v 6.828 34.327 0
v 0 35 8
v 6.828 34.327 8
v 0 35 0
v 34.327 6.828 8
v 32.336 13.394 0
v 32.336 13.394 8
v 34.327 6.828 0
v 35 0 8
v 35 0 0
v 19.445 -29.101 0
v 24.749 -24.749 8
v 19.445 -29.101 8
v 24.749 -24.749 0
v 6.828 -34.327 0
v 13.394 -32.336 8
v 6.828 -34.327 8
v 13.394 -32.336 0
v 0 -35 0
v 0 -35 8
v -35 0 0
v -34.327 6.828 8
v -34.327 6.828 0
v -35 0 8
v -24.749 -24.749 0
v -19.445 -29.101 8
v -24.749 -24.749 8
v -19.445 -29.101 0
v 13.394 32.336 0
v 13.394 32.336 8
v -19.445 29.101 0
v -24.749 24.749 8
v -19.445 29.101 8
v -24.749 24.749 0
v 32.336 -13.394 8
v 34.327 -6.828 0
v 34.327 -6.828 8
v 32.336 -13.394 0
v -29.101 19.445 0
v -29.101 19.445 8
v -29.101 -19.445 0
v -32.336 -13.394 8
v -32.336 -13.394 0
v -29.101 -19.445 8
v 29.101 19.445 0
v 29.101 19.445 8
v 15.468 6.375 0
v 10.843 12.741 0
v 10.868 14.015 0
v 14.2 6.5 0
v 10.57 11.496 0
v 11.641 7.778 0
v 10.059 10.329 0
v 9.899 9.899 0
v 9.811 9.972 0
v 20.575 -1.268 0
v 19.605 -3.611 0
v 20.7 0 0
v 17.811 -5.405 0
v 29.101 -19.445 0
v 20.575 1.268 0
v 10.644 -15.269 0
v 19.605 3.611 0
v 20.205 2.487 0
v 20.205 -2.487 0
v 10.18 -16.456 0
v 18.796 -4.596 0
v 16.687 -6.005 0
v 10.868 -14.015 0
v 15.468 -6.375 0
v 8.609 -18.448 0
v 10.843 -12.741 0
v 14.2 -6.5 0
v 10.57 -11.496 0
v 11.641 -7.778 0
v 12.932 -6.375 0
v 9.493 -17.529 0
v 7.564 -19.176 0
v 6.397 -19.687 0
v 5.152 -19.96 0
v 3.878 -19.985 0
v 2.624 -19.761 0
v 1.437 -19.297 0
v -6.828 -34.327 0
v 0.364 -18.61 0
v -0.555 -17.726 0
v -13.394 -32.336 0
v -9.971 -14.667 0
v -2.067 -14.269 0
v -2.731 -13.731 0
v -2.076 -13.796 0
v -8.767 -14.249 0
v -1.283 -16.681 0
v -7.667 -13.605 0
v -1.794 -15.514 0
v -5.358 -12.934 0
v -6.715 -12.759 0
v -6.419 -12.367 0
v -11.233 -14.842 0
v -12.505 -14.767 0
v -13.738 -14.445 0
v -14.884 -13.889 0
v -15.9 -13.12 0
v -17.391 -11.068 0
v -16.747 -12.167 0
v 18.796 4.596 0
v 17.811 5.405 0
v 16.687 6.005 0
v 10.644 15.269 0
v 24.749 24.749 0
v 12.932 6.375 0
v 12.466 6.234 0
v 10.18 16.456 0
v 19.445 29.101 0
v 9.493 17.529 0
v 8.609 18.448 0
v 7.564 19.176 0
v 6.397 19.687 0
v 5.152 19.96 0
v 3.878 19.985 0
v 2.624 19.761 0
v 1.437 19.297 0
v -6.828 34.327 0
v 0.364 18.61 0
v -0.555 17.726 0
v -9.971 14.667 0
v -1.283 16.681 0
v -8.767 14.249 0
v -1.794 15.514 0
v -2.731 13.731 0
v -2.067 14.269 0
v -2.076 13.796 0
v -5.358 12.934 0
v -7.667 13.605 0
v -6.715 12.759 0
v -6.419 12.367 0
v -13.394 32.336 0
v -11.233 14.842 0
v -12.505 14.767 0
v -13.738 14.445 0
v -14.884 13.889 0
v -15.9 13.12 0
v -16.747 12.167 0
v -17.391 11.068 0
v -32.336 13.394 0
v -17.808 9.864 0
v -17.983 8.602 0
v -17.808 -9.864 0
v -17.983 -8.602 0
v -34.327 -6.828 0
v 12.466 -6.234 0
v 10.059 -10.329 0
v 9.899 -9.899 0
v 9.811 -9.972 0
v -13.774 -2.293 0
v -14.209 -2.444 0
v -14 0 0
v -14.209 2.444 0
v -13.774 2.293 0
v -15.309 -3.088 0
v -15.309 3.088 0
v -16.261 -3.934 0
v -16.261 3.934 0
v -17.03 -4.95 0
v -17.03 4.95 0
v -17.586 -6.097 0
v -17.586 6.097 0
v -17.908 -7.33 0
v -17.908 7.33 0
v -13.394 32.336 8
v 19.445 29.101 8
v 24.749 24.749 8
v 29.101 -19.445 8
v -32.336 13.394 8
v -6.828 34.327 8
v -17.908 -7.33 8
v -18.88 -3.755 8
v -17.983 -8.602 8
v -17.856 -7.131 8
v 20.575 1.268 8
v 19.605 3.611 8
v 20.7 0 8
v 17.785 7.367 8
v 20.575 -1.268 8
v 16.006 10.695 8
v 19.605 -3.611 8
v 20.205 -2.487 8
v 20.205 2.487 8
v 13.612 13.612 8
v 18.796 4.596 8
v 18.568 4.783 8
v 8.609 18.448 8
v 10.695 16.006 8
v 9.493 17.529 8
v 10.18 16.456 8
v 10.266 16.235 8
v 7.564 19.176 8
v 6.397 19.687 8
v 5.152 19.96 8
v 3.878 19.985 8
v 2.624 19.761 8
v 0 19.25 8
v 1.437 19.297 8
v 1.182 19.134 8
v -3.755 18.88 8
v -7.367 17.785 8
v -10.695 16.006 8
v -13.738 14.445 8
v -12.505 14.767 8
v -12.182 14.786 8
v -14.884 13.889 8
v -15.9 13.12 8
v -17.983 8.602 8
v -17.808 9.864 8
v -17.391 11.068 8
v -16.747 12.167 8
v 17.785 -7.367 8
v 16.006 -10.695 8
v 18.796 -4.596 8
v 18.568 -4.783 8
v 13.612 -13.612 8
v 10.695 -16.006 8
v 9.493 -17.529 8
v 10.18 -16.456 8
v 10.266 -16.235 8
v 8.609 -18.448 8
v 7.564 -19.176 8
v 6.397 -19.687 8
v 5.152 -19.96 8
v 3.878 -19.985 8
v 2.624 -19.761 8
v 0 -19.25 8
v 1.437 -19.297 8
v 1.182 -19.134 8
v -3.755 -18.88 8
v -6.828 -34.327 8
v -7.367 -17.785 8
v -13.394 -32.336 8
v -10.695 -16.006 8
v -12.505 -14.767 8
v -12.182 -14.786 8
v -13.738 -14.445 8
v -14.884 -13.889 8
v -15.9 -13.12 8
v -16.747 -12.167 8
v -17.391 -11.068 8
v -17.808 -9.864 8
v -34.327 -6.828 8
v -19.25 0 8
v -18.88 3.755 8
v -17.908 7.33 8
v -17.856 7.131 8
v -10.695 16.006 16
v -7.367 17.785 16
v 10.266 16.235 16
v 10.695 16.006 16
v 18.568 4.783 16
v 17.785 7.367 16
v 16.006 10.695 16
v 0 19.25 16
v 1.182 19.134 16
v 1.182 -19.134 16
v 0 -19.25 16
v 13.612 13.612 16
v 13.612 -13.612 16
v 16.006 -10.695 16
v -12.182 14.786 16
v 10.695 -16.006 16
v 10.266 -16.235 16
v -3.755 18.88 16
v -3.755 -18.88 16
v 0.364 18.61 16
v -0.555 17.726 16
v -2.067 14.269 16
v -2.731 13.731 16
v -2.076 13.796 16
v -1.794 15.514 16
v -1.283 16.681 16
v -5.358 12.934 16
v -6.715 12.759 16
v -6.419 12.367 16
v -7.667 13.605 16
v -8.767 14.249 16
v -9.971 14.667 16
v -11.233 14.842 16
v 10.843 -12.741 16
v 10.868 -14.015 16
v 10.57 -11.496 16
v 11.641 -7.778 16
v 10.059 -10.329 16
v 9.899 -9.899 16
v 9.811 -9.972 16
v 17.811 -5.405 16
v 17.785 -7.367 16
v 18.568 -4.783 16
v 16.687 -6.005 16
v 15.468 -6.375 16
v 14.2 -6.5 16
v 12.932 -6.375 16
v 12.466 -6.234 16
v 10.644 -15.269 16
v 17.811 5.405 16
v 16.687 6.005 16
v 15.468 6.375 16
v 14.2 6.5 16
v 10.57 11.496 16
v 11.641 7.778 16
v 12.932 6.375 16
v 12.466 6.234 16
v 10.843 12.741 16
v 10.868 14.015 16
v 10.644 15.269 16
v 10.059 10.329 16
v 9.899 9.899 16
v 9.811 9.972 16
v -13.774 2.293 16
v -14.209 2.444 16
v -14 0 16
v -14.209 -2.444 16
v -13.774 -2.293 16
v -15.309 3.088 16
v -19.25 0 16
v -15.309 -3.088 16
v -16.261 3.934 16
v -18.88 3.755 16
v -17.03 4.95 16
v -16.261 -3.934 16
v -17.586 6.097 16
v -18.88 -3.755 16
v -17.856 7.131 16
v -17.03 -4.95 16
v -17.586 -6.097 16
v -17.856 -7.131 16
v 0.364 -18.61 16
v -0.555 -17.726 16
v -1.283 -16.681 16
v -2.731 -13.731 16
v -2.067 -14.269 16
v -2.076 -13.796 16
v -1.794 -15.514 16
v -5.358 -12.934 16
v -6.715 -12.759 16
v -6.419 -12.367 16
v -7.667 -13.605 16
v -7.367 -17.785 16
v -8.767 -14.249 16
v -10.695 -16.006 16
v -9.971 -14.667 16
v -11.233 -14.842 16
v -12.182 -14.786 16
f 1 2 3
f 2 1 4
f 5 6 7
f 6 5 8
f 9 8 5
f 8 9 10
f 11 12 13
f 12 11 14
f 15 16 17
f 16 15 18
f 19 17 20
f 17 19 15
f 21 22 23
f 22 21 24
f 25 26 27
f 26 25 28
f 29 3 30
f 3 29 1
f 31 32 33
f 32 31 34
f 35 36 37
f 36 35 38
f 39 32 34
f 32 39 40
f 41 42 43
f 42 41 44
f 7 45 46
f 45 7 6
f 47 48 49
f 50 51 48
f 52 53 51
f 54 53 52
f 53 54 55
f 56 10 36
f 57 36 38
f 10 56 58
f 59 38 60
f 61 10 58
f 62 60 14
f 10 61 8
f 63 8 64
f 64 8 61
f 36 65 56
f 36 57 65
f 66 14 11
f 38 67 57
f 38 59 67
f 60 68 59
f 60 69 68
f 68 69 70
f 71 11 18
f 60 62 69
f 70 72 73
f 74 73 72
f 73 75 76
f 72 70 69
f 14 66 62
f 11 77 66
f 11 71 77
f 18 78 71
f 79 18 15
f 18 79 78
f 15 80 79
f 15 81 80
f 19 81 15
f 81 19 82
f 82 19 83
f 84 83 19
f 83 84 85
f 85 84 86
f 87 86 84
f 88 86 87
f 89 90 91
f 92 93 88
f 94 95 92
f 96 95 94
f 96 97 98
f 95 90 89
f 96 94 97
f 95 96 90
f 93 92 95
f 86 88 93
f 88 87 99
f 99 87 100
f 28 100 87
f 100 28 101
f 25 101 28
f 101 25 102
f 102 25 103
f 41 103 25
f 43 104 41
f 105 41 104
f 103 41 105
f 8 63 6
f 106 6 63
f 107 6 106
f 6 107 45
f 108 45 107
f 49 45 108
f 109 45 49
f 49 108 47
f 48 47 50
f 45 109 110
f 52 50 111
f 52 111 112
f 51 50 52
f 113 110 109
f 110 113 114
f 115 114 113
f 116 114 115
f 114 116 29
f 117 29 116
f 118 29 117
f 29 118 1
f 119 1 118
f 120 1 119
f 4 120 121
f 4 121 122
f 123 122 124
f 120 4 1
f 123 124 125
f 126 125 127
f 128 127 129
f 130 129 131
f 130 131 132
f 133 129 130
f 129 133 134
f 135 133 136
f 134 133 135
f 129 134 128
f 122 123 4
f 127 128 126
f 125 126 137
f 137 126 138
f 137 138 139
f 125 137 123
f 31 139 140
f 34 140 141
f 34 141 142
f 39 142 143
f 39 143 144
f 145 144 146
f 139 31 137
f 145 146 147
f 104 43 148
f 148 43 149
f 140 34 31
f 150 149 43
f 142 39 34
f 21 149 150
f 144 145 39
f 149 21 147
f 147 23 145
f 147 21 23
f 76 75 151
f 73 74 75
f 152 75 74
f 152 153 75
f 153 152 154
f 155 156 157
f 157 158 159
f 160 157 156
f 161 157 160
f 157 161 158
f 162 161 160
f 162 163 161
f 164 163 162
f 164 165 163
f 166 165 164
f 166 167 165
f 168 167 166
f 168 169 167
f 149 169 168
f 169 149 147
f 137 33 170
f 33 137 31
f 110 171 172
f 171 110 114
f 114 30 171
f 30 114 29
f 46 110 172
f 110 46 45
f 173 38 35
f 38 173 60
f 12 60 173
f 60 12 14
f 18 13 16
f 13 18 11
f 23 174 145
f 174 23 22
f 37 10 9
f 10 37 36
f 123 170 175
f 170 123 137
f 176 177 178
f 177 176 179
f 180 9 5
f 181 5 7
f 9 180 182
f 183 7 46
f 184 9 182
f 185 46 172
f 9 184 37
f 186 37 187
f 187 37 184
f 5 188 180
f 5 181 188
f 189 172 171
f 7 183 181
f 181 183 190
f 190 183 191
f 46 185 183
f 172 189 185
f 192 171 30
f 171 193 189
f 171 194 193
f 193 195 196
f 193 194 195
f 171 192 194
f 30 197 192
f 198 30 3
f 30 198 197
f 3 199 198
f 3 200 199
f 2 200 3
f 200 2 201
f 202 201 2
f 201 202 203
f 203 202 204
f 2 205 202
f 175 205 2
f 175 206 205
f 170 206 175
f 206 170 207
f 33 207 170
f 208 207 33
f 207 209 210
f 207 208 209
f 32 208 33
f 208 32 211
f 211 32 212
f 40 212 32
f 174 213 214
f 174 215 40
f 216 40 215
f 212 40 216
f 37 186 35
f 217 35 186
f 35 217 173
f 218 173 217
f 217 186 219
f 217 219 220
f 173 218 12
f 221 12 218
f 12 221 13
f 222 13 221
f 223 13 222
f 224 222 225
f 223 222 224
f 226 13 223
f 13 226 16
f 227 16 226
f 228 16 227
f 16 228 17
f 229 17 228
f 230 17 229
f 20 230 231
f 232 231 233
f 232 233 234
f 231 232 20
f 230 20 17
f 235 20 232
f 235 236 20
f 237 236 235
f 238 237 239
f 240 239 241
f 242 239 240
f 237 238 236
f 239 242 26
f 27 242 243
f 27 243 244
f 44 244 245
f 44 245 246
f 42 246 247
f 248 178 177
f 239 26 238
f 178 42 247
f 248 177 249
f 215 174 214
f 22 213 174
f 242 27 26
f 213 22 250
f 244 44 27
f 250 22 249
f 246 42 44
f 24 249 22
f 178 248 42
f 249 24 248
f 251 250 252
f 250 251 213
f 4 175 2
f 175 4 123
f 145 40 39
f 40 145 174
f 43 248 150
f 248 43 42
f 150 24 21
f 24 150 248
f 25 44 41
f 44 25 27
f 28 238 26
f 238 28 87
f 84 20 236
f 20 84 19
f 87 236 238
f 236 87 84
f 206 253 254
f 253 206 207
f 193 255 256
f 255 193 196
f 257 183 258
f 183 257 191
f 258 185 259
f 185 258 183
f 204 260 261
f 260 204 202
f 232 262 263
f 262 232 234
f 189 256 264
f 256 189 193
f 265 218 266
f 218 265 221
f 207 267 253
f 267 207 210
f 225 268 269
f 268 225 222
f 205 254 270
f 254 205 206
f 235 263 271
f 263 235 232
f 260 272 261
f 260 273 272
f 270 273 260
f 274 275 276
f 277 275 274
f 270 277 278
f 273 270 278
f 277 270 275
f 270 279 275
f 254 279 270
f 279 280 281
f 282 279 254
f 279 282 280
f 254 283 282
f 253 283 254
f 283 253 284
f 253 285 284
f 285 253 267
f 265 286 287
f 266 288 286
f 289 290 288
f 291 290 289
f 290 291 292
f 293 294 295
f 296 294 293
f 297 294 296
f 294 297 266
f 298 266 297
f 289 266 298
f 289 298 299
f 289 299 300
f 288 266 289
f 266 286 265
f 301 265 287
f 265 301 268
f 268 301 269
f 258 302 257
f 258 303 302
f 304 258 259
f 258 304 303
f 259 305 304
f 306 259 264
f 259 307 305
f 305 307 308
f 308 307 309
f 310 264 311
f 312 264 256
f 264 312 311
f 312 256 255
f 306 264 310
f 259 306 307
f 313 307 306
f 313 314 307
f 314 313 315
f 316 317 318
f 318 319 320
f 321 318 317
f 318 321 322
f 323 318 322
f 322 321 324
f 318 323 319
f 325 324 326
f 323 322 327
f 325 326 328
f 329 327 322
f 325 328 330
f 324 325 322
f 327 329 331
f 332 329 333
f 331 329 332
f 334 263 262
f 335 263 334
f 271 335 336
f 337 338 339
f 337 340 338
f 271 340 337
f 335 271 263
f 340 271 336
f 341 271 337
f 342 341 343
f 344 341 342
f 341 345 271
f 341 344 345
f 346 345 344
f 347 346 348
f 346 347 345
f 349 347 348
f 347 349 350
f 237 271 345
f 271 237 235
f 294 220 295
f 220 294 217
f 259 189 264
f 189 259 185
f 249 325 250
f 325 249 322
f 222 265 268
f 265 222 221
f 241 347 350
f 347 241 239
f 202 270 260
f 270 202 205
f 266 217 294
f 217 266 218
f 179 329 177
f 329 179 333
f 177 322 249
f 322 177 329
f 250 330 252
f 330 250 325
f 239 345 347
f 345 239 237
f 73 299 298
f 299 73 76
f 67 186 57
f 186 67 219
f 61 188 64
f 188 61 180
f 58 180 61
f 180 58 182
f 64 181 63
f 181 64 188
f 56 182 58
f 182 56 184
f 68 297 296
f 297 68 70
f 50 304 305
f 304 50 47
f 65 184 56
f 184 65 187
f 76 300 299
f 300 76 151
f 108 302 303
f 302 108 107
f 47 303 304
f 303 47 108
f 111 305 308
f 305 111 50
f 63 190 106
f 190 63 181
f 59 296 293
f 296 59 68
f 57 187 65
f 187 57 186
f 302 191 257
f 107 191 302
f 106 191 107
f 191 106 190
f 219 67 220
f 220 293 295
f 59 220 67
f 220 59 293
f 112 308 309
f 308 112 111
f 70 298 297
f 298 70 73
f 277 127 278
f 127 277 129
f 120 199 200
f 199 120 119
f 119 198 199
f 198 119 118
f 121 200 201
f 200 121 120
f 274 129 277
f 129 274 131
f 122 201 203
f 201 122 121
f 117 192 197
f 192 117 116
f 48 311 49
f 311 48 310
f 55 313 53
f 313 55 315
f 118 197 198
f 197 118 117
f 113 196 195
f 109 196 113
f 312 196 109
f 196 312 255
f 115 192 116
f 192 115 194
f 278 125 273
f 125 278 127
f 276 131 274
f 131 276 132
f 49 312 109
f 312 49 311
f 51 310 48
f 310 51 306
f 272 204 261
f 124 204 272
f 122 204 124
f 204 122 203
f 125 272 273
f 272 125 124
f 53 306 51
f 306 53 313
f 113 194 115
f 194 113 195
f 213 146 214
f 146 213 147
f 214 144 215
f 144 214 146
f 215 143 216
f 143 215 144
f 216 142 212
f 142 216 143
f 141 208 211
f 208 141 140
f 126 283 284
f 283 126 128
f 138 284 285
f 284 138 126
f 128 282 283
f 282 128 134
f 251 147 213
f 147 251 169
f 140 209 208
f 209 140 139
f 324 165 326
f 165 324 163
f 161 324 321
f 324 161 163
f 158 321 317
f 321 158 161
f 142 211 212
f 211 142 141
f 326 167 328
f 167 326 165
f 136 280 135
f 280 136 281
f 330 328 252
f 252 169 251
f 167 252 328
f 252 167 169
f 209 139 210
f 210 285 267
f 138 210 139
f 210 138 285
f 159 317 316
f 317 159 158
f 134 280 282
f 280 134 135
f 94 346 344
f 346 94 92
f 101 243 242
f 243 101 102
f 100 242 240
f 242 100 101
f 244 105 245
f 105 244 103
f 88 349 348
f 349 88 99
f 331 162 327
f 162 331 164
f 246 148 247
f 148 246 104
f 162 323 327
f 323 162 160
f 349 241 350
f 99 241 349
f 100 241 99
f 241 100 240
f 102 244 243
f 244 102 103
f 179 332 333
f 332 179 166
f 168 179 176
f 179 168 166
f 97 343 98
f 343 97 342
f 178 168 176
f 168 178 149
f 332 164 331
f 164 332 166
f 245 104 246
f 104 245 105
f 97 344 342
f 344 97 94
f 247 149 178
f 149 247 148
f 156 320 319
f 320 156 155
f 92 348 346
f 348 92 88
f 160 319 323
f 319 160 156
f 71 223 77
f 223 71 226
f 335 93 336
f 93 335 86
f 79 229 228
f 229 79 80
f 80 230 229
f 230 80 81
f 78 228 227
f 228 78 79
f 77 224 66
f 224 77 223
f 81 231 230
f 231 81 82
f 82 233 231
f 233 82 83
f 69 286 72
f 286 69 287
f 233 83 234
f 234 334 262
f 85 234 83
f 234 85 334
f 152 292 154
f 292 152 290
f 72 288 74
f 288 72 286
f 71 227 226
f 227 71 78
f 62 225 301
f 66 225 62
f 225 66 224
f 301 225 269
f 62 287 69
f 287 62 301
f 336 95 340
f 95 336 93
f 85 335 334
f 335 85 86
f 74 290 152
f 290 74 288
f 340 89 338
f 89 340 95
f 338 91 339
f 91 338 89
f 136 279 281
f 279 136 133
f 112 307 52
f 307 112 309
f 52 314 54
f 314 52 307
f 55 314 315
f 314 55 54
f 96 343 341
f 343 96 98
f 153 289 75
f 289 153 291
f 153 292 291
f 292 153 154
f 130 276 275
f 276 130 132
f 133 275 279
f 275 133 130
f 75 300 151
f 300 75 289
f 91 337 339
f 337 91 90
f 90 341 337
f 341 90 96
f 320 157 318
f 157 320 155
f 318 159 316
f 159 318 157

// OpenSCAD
$fn = 32;

// ----------------------------------------------------------------------
// Bolt-circle flange: 70 mm outside, 5 bolt holes, bore 28 mm
// ----------------------------------------------------------------------

// --- parameters (mm) ---
flange_d = 70;            // flange outside diameter
flange_t = 8;             // flange thickness
bolts = 5;                // number of bolt holes
bolt_d = 13;              // bolt clearance
bolt_r = 14.2;            // bolt circle radius
bore_d = 28;              // centre bore
hub_d = 38.5;             // raised hub diameter
hub_h = 8;                // raised hub height

module body() {
  cylinder(h = flange_t, d = flange_d);
  /* raised hub, sunk 1 mm into the flange */
  translate([0, 0, flange_t - 1]) cylinder(h = hub_h + 1, d = hub_d);
}

difference() {
  body();
  /* bolt circle */
  for (i = [0 : bolts - 1]) rotate([0, 0, i * 360 / bolts]) translate([bolt_r, 0, -1]) cylinder(h = flange_t + hub_h + 3, d = bolt_d);
  translate([0, 0, -1]) cylinder(h = flange_t + hub_h + 3, d = bore_d);
}
